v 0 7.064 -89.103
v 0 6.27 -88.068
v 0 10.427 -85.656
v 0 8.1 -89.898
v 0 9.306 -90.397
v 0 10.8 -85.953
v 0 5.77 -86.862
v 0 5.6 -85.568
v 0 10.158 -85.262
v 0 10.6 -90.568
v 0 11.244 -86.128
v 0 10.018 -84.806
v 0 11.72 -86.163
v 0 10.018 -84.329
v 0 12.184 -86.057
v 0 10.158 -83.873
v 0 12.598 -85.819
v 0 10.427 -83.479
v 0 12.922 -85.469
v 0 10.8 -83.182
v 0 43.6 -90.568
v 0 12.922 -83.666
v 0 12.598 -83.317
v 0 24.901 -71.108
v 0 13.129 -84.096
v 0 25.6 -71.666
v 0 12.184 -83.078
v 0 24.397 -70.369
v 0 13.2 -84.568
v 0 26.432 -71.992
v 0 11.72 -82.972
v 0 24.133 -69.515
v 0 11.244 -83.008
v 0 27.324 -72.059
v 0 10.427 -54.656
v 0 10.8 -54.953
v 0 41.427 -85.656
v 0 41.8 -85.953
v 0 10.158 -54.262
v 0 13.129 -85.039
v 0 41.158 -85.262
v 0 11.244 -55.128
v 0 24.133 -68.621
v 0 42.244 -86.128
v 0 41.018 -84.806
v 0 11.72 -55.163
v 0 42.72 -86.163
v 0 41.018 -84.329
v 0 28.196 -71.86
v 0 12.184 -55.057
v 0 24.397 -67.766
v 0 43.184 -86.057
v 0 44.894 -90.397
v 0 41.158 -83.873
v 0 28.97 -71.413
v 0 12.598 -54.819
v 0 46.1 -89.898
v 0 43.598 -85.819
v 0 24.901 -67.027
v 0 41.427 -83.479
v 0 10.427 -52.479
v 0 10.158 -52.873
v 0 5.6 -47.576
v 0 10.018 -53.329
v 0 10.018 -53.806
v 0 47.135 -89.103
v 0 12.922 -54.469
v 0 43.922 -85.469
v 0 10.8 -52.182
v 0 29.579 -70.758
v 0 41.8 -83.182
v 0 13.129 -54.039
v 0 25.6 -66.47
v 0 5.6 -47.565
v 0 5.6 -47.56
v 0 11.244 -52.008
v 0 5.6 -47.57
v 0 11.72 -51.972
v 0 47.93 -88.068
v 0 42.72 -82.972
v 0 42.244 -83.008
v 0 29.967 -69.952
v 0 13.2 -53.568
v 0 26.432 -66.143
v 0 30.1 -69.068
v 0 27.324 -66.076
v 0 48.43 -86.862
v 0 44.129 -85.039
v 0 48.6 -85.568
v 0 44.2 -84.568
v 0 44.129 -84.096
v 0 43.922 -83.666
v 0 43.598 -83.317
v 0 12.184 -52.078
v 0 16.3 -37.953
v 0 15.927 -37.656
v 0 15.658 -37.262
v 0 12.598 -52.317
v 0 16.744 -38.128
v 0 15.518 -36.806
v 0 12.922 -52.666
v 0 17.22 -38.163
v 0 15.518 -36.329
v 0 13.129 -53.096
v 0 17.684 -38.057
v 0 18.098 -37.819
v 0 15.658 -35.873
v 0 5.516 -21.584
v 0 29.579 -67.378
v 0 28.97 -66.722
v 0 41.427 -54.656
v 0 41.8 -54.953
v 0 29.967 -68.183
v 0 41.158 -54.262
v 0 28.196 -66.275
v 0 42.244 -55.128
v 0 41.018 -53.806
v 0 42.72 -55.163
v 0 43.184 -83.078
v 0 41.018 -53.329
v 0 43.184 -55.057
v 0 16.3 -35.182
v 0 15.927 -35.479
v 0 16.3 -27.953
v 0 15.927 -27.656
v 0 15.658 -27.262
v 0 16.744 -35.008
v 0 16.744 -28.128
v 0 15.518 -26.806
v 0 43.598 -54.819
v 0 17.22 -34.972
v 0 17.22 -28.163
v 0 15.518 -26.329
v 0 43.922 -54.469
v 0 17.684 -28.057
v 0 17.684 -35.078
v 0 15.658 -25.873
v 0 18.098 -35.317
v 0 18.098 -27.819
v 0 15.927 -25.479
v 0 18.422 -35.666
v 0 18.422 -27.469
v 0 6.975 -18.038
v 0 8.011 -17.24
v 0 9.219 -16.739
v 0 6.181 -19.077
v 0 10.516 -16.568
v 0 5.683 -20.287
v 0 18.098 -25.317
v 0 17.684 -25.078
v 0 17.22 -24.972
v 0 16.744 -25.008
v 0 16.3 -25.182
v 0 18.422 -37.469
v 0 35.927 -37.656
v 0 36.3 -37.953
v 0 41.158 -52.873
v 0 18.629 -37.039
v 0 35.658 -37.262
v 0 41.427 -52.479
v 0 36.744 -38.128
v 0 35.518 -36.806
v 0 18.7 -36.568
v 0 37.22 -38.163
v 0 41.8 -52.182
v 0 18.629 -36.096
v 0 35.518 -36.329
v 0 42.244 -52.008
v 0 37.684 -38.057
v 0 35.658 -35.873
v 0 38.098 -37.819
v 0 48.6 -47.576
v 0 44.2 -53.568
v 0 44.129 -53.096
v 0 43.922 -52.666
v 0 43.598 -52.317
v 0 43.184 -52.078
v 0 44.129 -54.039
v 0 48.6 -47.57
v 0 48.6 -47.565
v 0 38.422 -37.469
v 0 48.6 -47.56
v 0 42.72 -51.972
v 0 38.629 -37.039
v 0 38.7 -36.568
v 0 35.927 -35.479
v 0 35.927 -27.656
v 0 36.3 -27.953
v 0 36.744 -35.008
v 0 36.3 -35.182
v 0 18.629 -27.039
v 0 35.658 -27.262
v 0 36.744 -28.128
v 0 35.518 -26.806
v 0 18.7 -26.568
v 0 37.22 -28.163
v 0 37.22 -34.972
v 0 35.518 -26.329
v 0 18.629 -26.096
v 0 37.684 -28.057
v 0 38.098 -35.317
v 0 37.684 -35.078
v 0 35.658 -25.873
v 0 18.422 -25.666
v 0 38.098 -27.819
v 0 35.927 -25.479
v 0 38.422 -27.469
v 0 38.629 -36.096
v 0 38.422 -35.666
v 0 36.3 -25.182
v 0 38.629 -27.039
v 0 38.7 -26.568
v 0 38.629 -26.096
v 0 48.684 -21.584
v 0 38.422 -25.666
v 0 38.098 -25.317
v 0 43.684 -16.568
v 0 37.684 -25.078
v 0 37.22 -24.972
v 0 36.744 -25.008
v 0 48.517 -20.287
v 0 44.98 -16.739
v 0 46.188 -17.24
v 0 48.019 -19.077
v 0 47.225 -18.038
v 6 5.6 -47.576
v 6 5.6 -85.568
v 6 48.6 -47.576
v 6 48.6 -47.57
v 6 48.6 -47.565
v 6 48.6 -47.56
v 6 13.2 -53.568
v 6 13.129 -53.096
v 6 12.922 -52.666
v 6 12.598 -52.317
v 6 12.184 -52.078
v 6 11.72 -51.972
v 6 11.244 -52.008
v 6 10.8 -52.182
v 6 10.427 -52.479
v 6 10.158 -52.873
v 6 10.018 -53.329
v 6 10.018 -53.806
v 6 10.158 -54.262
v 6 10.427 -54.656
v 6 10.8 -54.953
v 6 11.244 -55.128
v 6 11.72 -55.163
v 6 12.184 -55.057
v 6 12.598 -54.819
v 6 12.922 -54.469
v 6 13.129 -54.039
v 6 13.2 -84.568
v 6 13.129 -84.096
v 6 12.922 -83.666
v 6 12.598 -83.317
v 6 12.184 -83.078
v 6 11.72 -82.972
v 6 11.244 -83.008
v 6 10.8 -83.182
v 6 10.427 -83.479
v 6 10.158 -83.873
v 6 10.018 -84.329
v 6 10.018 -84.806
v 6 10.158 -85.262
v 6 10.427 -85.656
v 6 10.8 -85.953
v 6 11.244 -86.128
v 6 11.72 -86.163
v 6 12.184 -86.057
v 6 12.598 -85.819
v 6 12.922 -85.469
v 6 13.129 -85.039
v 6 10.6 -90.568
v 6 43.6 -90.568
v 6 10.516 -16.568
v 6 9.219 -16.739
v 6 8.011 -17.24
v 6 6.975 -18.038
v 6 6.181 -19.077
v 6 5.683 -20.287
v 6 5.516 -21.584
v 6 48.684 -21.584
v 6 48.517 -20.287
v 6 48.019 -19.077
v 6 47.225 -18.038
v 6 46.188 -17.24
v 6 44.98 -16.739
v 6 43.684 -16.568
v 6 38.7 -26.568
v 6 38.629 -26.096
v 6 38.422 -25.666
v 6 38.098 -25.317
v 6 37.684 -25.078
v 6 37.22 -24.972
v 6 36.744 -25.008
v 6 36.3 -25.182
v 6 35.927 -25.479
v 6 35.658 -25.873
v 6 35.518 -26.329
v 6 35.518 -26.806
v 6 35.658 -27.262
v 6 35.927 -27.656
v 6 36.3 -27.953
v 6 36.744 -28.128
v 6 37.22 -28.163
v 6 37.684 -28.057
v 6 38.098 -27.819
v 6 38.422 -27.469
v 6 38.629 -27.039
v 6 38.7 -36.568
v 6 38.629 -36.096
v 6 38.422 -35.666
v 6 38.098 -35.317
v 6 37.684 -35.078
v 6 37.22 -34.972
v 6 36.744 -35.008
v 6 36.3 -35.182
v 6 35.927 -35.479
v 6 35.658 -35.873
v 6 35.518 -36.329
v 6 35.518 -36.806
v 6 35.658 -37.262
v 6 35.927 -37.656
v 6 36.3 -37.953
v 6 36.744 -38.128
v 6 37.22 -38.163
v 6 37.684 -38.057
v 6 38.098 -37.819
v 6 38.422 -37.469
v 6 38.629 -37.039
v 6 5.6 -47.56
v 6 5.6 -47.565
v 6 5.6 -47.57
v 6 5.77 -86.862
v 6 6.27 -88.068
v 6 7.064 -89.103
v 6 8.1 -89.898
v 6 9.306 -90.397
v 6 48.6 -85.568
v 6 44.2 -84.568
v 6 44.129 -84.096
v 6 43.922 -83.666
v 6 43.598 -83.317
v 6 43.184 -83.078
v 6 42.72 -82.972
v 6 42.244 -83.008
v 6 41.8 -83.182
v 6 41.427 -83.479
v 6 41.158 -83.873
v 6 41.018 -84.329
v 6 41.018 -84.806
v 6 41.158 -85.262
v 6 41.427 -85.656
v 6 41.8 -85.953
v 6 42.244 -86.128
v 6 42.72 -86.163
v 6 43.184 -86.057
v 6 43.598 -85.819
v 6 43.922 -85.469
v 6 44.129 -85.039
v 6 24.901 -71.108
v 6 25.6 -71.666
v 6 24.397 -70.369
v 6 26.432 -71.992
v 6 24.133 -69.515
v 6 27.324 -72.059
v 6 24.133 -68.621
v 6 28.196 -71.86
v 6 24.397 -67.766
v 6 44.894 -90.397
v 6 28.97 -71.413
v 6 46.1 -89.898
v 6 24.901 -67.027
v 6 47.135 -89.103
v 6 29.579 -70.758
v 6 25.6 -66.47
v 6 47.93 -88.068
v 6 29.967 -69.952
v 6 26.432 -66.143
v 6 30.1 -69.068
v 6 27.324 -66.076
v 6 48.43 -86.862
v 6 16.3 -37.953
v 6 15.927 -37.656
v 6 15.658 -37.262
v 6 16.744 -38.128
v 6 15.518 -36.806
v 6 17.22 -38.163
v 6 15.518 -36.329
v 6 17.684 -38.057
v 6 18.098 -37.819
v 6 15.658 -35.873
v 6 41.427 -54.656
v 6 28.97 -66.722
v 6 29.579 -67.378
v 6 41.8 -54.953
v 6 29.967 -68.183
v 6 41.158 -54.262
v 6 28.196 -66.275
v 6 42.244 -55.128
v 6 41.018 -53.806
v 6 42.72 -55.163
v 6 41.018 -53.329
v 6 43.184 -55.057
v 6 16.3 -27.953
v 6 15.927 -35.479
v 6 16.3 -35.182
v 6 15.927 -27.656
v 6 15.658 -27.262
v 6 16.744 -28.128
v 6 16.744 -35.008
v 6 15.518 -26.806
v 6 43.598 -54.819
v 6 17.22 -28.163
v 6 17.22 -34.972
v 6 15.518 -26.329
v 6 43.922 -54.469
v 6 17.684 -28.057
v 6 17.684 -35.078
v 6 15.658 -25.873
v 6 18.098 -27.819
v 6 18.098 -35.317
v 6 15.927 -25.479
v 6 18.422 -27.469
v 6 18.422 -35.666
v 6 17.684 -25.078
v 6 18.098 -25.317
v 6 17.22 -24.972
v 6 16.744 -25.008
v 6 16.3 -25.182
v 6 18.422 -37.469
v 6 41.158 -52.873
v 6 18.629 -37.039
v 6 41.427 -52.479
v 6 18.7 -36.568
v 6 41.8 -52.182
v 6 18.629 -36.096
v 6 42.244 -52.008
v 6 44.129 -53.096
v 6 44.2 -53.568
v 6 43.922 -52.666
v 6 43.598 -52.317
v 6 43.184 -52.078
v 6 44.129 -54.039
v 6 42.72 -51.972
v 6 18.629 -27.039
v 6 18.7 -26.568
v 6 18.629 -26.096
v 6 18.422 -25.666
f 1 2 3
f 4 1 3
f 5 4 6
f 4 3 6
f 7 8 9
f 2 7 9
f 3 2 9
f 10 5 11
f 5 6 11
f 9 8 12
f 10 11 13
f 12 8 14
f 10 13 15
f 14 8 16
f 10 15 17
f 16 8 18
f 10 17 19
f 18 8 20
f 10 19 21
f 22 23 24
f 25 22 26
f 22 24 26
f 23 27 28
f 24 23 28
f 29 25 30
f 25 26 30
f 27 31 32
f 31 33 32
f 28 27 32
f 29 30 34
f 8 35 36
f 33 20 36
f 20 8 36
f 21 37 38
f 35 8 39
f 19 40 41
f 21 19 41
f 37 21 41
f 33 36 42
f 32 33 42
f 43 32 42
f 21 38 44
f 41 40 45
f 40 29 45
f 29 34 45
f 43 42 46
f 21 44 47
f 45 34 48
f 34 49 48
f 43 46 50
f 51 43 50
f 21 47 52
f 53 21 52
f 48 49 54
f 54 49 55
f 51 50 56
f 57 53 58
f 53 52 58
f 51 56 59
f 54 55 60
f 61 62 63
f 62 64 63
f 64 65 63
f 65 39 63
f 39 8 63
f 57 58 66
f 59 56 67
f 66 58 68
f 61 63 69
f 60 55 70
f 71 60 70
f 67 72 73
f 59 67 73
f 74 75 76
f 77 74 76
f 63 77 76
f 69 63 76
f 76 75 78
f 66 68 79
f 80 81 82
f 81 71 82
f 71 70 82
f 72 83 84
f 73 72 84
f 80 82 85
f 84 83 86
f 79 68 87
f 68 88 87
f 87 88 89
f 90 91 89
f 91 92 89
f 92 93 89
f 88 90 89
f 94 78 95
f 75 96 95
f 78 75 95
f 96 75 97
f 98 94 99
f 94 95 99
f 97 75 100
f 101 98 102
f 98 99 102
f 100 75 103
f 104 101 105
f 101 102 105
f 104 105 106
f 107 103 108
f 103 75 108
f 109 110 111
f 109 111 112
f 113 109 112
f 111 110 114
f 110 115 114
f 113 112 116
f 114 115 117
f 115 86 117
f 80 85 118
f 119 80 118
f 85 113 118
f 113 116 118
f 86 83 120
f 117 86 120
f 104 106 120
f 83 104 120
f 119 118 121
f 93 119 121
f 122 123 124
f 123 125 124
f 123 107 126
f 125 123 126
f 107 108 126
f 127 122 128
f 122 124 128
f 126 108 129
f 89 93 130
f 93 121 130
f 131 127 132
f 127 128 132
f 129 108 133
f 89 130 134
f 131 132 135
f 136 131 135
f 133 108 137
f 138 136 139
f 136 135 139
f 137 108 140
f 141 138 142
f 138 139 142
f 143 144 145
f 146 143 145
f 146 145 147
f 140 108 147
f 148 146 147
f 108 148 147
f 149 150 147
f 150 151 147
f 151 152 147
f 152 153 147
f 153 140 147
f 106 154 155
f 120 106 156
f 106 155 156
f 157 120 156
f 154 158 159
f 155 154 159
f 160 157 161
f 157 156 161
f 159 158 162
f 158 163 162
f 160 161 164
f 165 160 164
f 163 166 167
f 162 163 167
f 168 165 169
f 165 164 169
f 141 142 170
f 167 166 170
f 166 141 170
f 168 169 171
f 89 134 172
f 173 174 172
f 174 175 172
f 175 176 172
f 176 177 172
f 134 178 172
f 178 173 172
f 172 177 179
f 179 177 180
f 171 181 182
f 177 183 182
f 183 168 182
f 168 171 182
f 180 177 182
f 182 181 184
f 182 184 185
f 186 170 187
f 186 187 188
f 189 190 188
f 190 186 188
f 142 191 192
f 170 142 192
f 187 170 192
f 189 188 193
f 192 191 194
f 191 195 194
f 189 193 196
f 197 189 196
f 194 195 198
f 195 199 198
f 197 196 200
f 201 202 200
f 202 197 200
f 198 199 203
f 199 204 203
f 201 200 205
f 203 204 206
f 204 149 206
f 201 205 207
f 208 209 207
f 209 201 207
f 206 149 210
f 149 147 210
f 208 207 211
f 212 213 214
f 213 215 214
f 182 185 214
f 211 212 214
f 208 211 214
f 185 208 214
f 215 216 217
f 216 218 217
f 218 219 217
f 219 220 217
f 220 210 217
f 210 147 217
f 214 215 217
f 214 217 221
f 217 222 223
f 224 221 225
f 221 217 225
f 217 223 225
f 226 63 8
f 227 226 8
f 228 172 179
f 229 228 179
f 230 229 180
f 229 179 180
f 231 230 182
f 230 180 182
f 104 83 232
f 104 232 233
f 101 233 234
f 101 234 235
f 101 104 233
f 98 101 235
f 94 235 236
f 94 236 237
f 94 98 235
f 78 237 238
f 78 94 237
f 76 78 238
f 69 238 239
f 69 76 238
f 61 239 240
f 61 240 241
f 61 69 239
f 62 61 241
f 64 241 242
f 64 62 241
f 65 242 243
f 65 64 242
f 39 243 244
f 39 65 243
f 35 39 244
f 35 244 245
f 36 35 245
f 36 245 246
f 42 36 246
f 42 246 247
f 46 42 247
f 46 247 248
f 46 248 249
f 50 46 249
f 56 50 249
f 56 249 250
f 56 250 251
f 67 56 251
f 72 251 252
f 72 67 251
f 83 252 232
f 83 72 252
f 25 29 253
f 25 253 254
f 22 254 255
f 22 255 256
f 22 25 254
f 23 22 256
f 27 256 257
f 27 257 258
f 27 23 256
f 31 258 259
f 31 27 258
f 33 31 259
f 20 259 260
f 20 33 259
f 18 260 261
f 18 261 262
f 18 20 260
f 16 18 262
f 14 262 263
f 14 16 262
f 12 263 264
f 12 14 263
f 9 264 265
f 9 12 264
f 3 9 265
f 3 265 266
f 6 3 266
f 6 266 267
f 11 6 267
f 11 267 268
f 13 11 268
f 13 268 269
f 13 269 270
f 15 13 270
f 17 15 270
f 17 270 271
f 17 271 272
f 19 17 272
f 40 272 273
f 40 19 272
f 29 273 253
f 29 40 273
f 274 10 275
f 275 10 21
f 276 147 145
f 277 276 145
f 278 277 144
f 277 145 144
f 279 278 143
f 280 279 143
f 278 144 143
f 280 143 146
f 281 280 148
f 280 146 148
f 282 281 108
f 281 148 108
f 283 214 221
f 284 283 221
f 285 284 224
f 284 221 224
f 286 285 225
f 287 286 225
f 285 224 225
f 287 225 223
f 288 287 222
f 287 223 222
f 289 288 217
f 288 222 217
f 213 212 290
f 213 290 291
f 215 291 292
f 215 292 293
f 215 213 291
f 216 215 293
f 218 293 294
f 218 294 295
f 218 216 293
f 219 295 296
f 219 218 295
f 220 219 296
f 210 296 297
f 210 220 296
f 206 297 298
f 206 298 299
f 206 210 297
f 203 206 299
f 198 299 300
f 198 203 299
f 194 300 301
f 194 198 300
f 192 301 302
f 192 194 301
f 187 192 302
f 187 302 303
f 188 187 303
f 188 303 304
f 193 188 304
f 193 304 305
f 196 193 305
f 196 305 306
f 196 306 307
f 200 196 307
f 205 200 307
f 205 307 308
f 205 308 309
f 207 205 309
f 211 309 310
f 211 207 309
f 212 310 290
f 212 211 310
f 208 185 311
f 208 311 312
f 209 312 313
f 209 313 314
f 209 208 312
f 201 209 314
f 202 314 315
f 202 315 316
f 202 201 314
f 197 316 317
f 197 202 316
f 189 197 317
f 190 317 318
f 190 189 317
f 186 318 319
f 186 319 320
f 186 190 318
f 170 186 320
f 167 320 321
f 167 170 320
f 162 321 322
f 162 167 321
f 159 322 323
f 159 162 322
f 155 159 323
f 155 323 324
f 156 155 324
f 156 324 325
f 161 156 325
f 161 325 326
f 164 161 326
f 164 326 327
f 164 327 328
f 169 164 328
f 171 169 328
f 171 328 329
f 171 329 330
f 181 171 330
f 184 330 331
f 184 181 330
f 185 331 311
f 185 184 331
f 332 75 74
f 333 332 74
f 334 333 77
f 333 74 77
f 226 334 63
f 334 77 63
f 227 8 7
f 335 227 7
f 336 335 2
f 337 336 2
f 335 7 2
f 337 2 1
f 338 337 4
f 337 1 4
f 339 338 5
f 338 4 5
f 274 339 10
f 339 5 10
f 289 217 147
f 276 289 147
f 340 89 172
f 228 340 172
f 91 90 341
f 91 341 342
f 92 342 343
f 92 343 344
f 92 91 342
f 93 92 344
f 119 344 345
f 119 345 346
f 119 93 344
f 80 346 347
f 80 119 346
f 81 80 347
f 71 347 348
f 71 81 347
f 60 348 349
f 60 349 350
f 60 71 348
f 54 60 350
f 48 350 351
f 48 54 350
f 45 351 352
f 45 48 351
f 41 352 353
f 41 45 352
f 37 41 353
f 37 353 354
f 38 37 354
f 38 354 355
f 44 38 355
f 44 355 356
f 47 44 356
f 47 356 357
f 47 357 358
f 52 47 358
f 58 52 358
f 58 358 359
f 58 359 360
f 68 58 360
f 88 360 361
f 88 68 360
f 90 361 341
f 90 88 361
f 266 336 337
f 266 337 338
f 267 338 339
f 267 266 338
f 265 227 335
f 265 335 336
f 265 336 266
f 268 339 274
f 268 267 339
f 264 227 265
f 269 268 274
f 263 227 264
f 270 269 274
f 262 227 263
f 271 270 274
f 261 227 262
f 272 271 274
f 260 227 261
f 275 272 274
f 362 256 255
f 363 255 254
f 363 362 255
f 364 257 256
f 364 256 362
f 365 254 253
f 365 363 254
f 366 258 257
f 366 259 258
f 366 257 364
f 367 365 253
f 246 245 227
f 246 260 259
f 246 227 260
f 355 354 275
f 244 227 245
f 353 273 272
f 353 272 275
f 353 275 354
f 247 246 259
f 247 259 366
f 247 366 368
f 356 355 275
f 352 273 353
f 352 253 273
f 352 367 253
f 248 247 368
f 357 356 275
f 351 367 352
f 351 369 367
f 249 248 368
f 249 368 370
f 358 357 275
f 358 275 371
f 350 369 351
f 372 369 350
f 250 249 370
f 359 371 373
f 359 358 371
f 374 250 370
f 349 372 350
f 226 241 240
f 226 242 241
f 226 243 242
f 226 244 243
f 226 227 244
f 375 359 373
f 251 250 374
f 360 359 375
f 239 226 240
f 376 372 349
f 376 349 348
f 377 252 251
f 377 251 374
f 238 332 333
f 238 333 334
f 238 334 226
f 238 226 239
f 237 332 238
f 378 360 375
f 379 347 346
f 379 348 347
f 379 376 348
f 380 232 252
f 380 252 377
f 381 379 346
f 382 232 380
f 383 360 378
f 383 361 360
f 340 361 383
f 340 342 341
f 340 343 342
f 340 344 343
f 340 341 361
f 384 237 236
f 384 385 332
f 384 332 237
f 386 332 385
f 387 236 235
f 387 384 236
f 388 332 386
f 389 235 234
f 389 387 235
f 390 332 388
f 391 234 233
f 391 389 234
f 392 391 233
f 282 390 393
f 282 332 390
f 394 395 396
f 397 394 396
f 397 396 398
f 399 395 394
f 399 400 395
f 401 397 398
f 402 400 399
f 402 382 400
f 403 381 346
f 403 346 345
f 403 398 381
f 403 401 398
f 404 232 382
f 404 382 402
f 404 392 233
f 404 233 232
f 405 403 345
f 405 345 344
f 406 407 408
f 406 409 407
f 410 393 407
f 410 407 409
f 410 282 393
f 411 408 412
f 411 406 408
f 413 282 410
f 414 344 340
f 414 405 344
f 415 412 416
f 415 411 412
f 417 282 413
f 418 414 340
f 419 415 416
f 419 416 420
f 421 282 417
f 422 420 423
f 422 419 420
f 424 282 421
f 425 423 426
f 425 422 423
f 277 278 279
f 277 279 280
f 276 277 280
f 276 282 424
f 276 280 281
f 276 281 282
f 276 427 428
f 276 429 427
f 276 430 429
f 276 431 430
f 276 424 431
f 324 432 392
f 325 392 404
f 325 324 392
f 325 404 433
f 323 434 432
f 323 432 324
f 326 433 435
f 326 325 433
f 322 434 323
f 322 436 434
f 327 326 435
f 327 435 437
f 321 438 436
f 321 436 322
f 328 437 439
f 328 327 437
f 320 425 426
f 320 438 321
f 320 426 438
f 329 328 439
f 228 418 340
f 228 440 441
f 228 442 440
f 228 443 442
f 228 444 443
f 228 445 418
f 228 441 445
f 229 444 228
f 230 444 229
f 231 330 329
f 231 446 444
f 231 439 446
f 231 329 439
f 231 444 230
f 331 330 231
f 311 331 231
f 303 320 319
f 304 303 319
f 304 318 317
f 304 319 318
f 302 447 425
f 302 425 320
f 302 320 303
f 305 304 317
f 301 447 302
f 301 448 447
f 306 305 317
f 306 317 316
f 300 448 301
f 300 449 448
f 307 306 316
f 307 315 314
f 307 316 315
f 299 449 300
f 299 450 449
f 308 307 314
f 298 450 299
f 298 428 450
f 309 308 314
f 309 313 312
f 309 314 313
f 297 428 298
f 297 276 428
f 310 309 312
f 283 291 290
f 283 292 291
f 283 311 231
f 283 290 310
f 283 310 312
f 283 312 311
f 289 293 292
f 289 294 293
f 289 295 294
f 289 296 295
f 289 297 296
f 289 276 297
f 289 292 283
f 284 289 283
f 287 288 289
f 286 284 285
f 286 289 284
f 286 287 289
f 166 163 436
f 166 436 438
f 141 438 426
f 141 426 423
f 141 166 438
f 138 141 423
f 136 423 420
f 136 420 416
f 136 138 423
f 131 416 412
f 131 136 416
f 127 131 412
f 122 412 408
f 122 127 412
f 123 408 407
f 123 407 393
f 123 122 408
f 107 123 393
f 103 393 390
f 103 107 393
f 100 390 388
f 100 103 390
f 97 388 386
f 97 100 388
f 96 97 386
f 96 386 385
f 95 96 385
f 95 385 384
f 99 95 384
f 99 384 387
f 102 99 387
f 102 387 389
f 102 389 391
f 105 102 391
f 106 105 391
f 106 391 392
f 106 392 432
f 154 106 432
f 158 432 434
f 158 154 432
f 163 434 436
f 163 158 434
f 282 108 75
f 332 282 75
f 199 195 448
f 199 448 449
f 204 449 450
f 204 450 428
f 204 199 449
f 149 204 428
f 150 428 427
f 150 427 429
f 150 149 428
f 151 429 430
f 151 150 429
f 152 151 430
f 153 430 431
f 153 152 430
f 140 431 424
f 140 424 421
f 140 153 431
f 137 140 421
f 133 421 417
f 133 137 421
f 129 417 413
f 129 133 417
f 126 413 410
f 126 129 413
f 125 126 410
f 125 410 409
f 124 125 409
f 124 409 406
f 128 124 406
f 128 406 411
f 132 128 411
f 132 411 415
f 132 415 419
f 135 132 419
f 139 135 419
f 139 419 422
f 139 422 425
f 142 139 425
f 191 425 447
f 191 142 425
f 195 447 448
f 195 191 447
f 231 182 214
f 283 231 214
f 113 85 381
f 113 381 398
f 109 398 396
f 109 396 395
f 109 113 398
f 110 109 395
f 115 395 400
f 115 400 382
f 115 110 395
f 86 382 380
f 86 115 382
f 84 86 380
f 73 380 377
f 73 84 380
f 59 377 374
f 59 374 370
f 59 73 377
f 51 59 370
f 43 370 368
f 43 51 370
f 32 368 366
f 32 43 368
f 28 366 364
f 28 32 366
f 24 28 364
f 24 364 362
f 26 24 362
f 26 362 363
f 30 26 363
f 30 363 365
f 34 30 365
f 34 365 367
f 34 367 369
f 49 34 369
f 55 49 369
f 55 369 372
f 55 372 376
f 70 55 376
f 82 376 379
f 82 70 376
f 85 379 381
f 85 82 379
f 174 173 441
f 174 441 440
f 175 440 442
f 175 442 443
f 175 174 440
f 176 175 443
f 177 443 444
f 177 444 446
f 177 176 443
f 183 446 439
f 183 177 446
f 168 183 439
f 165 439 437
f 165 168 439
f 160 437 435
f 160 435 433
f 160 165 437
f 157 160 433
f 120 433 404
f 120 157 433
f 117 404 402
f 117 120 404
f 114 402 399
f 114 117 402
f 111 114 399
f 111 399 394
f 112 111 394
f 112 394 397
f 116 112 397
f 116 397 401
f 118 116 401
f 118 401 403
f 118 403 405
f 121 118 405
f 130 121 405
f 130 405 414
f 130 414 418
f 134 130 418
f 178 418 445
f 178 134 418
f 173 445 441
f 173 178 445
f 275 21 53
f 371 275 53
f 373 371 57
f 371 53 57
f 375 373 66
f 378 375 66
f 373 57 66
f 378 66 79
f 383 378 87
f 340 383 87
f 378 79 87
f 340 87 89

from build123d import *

# Parameters (mm, degrees)
F0_R     = 1.6
F0_R_2   = 3
F1_DEPTH = 6


with BuildPart() as f1:
    # F0 (on Right) → F1 (new body)
    with BuildSketch(Plane.YZ):
        with BuildLine():
            Line((5.599948, -47.575754), (5.599948, -85.56769))
            ThreePointArc((5.599948, -85.56769), (7.064414, -89.103224), (10.599948, -90.56769))
            Line((10.599948, -90.56769), (43.599948, -90.56769))
            ThreePointArc((43.599948, -90.56769), (47.135482, -89.103224), (48.599948, -85.56769))
            Line((48.599948, -85.56769), (48.599948, -47.575754))
            ThreePointArc((48.599948, -47.575754), (48.599955, -47.567689), (48.599974, -47.559625))
            Line((48.599974, -47.559625), (48.683767, -21.583819))
            ThreePointArc((48.683767, -21.583819), (47.225025, -18.037863), (43.683793, -16.56769))
            Line((43.683793, -16.56769), (10.516103, -16.56769))
            ThreePointArc((10.516103, -16.56769), (6.974871, -18.037863), (5.516129, -21.583819))
            Line((5.516129, -21.583819), (5.599922, -47.559625))
            ThreePointArc((5.599922, -47.559625), (5.599941, -47.567689), (5.599948, -47.575754))
        make_face()
        with Locations((11.599948, -84.56769)):
            Circle(F0_R, mode=Mode.SUBTRACT)
        with Locations((42.599948, -84.56769)):
            Circle(F0_R, mode=Mode.SUBTRACT)
        with Locations((27.099948, -69.06769)):
            Circle(F0_R_2, mode=Mode.SUBTRACT)
        with Locations((11.599948, -53.56769)):
            Circle(F0_R, mode=Mode.SUBTRACT)
        with Locations((17.099948, -36.56769)):
            Circle(F0_R, mode=Mode.SUBTRACT)
        with Locations((17.099948, -26.56769)):
            Circle(F0_R, mode=Mode.SUBTRACT)
        with Locations((37.099948, -36.56769)):
            Circle(F0_R, mode=Mode.SUBTRACT)
        with Locations((42.599948, -53.56769)):
            Circle(F0_R, mode=Mode.SUBTRACT)
        with Locations((37.099948, -26.56769)):
            Circle(F0_R, mode=Mode.SUBTRACT)
    extrude(amount=F1_DEPTH)


solid = f1.part
